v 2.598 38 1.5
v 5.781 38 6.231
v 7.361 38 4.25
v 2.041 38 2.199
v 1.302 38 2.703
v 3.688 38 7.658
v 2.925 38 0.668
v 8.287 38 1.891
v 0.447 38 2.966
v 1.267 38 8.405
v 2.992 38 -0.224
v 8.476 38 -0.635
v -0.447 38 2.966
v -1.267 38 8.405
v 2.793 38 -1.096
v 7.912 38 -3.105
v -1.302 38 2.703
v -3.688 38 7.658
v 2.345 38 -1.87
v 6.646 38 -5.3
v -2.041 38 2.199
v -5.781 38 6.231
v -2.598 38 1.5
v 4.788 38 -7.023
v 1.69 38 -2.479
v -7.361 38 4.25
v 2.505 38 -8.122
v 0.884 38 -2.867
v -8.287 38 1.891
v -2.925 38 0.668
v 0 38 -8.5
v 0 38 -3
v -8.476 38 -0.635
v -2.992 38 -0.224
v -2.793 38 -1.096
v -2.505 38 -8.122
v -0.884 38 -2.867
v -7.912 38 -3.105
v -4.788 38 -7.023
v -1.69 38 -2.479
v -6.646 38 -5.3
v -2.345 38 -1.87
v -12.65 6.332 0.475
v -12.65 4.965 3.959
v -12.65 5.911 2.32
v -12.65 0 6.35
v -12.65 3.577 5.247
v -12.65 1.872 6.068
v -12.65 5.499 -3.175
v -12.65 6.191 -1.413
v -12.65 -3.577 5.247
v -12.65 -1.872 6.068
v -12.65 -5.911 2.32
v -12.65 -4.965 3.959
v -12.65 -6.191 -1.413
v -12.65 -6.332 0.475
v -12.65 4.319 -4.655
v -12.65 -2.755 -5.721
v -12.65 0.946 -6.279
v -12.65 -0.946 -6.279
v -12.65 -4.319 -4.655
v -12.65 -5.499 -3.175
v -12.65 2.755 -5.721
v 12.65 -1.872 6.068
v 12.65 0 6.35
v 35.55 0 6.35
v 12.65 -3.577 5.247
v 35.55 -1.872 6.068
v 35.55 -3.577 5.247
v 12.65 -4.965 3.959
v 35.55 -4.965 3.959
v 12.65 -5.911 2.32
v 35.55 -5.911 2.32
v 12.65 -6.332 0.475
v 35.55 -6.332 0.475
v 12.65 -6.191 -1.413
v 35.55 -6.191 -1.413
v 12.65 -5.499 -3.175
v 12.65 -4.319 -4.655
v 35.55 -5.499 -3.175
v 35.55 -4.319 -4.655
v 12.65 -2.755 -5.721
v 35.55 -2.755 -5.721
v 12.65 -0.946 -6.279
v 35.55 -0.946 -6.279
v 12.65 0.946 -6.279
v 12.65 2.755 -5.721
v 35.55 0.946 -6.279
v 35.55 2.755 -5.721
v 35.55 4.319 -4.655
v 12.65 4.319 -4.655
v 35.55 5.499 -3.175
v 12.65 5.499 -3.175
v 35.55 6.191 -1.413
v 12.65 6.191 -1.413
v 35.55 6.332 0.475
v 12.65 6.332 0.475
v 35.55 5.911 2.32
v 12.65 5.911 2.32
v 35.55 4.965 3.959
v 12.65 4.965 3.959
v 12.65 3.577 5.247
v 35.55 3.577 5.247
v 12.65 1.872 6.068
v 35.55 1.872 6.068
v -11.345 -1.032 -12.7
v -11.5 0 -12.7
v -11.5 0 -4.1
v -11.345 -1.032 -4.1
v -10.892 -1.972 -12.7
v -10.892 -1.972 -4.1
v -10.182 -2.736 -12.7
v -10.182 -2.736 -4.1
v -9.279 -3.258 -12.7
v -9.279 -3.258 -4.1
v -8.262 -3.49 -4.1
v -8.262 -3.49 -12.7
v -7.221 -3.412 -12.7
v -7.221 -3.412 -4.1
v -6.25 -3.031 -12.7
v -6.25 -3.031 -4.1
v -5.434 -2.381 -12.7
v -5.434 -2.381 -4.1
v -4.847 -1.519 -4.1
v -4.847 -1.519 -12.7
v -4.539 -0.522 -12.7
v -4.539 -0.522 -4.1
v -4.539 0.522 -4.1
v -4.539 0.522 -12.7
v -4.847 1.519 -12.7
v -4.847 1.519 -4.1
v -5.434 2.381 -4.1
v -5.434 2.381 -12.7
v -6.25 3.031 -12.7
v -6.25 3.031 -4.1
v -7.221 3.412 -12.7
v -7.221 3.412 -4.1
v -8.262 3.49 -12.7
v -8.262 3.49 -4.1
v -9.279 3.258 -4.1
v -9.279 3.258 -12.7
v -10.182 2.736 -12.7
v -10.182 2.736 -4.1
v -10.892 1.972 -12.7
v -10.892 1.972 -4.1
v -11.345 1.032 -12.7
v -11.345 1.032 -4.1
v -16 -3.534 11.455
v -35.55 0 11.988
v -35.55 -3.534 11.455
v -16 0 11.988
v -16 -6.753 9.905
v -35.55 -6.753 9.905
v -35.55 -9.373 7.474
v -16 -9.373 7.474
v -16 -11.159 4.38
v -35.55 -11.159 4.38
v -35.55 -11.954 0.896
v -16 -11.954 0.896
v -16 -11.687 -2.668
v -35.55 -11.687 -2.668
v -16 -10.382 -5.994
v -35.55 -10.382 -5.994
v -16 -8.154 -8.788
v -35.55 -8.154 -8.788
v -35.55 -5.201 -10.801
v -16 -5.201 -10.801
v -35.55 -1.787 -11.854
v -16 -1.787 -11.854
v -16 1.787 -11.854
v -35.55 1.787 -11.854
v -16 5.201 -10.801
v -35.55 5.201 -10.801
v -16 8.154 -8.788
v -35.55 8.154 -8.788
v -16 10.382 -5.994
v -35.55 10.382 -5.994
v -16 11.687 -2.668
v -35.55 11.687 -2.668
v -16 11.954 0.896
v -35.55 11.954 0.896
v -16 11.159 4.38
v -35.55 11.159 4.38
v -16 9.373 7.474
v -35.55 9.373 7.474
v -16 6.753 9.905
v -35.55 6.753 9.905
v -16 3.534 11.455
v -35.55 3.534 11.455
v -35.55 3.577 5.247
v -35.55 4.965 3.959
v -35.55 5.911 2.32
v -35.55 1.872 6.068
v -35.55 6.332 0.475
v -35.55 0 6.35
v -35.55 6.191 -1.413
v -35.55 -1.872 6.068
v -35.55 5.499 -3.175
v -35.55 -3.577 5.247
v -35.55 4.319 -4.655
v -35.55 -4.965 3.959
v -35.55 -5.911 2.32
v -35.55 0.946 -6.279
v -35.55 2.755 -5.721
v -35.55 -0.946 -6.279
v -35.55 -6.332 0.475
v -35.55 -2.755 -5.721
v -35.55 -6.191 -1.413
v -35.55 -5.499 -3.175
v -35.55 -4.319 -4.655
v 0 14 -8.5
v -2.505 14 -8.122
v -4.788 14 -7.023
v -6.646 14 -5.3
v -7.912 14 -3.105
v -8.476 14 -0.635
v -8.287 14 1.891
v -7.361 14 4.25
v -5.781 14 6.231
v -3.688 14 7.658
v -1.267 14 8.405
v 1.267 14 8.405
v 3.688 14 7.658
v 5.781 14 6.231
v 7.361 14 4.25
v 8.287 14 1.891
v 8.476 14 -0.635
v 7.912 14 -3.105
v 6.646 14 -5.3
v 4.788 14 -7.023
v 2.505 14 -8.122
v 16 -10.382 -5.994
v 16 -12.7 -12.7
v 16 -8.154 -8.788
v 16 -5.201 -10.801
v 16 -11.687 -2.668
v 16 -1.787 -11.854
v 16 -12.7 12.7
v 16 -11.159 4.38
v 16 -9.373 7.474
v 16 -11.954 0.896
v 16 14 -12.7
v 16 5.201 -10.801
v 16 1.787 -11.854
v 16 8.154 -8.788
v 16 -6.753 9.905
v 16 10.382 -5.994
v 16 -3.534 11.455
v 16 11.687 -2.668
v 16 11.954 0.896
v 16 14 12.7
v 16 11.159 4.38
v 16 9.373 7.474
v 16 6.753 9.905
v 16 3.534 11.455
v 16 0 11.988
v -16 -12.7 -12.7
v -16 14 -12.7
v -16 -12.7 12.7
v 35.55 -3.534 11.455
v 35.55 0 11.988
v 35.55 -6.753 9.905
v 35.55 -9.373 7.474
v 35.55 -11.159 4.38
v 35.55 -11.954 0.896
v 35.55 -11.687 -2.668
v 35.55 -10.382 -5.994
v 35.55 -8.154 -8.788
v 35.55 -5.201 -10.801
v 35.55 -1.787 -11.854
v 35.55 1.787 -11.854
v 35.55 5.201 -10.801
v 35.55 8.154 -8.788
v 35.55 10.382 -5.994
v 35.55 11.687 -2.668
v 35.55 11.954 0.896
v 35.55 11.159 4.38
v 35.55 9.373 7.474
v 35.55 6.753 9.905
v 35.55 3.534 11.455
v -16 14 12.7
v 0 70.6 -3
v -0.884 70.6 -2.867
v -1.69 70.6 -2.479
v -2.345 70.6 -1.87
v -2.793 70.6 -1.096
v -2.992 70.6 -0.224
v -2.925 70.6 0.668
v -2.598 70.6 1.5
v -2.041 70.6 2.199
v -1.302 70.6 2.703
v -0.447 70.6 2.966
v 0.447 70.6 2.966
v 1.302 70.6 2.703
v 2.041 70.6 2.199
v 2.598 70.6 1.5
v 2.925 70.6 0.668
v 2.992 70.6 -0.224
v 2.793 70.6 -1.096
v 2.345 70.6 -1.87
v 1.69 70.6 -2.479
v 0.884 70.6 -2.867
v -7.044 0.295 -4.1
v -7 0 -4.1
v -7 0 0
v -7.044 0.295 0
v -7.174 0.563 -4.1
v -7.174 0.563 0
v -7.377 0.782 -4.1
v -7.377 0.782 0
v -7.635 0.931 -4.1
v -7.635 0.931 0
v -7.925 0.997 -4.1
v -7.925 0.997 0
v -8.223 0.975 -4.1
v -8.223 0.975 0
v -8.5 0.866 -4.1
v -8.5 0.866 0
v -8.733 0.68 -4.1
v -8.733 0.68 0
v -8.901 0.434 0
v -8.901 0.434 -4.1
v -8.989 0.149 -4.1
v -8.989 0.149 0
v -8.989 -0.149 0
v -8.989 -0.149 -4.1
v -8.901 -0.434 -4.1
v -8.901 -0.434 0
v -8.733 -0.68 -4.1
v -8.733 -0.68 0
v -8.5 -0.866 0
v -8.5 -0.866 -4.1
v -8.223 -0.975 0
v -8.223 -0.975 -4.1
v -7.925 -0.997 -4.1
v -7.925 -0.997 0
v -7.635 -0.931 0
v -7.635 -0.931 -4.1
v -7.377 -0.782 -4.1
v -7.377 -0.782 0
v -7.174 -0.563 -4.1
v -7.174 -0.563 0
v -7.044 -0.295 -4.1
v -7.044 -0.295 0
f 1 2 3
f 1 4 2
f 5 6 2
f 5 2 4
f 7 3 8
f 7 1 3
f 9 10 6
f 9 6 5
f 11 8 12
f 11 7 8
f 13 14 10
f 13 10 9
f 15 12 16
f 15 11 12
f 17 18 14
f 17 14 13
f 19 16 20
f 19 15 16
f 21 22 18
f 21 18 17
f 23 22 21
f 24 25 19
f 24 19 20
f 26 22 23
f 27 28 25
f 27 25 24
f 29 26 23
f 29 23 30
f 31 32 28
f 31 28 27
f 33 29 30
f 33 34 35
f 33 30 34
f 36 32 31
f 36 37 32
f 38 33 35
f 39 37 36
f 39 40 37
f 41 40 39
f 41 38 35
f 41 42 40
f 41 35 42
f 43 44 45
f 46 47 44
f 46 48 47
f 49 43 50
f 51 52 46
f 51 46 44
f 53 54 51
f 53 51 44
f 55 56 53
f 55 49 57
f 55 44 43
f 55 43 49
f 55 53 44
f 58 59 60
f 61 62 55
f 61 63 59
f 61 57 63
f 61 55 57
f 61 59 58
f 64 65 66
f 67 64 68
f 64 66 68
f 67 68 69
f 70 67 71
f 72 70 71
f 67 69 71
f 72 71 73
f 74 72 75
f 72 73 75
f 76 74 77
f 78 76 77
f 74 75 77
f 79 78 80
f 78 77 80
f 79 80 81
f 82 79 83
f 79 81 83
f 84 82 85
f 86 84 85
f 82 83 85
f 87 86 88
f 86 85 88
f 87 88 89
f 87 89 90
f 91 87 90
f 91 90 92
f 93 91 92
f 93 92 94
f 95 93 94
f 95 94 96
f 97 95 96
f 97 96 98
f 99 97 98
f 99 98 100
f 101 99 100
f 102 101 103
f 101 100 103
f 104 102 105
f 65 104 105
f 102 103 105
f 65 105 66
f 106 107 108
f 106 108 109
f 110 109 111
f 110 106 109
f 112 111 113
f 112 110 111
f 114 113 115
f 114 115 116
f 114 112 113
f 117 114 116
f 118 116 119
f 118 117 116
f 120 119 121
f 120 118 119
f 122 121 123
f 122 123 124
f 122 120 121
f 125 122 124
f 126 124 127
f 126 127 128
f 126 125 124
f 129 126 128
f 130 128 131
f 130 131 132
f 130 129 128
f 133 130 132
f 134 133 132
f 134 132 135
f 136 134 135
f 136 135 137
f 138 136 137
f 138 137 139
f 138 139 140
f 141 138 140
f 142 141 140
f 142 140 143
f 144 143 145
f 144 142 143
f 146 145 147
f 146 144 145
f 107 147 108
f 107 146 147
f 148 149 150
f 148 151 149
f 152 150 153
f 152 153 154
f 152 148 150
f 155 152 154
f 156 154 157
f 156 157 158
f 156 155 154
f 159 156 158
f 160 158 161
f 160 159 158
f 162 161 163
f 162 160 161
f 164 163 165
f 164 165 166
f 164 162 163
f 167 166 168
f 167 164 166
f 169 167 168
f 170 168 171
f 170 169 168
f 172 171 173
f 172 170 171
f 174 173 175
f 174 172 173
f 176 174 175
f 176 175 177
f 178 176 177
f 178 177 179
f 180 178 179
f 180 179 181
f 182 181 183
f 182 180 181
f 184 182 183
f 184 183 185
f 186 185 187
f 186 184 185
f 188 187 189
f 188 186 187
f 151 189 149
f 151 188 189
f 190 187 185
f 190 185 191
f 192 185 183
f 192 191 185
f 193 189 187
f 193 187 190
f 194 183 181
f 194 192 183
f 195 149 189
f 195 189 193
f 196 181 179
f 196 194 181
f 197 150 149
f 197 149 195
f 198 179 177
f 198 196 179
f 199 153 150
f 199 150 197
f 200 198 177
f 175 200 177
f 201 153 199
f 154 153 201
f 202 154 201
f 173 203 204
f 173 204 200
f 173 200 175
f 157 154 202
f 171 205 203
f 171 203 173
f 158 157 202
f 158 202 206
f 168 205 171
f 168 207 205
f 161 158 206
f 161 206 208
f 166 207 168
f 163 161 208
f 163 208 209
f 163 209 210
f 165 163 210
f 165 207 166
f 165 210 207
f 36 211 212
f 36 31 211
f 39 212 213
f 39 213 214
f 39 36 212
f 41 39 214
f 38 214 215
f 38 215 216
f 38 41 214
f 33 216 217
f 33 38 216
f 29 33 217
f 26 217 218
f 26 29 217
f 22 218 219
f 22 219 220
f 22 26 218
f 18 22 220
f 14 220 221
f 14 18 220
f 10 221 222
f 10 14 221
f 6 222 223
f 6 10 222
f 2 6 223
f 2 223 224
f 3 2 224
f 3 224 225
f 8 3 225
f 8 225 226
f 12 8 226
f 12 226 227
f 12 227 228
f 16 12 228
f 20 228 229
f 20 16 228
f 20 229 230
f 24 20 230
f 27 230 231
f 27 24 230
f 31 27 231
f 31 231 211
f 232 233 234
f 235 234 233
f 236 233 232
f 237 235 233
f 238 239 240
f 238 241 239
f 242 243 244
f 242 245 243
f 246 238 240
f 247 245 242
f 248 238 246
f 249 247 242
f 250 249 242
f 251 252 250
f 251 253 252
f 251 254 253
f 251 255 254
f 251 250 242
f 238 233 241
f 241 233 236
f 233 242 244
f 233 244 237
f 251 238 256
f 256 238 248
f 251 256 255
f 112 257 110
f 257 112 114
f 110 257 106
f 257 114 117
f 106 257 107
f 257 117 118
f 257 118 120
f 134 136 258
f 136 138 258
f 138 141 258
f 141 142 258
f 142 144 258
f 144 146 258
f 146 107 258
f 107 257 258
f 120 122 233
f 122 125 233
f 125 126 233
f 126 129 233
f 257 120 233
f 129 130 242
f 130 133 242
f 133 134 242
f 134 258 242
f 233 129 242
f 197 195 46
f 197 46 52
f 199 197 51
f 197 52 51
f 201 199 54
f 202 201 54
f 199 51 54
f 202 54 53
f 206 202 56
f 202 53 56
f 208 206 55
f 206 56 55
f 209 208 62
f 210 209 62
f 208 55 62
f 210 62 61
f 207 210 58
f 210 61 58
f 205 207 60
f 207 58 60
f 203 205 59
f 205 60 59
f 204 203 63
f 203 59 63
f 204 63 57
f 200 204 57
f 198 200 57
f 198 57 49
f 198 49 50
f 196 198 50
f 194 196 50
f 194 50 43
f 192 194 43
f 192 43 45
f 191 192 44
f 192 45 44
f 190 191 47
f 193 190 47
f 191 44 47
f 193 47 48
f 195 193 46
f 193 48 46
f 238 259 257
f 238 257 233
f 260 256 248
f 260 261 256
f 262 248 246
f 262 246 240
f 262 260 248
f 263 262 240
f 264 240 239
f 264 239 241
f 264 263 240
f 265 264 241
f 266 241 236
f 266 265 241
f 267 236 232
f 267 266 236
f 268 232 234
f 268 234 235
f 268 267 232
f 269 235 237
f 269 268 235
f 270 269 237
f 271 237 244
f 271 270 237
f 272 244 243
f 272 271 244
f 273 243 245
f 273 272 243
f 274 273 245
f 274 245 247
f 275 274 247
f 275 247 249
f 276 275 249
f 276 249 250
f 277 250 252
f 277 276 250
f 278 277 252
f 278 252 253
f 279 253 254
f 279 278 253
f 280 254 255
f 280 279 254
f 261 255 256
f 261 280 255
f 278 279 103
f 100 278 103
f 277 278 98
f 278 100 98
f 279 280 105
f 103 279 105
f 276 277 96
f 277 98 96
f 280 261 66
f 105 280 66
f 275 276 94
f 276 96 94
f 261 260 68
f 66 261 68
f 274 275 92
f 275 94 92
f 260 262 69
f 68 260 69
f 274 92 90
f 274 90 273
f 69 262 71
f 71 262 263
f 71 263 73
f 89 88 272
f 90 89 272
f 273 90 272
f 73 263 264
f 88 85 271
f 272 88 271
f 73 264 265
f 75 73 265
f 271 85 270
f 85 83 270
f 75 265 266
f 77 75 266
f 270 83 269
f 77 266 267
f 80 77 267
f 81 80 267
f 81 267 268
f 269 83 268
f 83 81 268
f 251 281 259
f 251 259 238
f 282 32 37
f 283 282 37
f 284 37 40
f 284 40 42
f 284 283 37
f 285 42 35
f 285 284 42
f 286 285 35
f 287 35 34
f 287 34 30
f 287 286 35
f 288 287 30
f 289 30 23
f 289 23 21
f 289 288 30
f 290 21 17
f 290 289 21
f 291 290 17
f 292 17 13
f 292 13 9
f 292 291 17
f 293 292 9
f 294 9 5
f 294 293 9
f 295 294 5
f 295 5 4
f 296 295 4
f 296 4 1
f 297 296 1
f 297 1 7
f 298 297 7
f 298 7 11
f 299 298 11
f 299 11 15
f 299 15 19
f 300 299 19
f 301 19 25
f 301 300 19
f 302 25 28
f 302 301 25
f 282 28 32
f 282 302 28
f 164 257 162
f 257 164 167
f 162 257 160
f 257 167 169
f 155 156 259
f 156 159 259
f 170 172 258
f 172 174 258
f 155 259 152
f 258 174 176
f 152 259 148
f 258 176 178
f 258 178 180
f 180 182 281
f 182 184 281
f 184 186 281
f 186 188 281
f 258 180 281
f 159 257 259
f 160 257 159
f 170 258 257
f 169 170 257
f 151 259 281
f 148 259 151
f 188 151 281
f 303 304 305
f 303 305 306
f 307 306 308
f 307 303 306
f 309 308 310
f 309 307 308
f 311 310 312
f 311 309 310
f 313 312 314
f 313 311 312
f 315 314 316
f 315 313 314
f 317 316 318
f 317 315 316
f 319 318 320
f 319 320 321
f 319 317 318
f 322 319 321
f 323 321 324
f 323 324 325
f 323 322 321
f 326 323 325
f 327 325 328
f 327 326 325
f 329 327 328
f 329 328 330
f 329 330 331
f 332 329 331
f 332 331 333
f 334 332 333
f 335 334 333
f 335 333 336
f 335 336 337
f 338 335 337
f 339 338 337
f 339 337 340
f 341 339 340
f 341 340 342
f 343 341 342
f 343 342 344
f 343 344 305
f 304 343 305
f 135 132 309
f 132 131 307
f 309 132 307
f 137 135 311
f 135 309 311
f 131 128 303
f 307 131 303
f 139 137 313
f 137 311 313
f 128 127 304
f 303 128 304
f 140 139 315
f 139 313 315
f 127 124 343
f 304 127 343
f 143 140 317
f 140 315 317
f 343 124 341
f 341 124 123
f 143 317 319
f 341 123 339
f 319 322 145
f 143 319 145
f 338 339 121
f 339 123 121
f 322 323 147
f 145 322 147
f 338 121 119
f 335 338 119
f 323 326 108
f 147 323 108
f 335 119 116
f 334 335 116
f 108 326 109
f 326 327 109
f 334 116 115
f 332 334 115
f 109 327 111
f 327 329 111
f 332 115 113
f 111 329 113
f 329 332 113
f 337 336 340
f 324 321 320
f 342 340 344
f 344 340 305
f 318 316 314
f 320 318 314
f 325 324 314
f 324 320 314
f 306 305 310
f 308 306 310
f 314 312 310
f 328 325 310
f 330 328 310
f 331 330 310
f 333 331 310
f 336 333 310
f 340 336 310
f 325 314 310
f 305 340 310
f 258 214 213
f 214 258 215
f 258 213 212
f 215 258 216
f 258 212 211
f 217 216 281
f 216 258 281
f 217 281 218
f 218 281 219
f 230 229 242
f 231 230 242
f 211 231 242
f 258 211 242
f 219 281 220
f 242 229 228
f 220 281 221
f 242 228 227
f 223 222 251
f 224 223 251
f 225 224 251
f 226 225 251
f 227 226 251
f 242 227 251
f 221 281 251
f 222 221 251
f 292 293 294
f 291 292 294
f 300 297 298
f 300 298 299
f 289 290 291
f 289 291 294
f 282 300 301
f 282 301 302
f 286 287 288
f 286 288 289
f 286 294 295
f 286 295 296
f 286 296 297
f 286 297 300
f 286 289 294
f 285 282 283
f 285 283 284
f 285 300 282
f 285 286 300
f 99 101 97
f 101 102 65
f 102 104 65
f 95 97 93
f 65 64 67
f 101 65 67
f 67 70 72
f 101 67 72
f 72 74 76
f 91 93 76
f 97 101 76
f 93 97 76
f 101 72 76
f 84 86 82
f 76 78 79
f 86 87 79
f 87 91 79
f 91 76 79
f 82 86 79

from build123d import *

# Parameters (mm, degrees)
BODY_SKETCH_W                   = 32
BODY_SKETCH_H                   = 26.7
BODY_DEPTH                      = 12.7
NUT_X_SKETCH_W                  = 19.55
NUT_X_SKETCH_H                  = 11.988
NUT_X_SKETCH_2_W                = 19.55
NUT_X_SKETCH_2_H                = 11.988
SOCKET_X_SKETCH_W               = 23.9
SOCKET_X_SKETCH_H               = 6.35
SOCKET_X_SKETCH_2_W             = 23.9
SOCKET_X_SKETCH_2_H             = 6.35
TORCH_NITROUS_PORT_SKETCH_R     = 3.5
TORCH_NITROUS_PORT_DEPTH        = 8.6
TORCH_NITROUS_DRILLING_SKETCH_R = 1
TORCH_NITROUS_DRILLING_DEPTH    = 12.7


with BuildPart() as part:
    # Body Sketch → Body (new, symmetric)
    with BuildSketch(Plane.XY):
        with Locations((0, 0.65)):
            Rectangle(BODY_SKETCH_W, BODY_SKETCH_H)
    extrude(amount=BODY_DEPTH, both=True)

    # Nut _X Sketch → Nut _X (revolve)
    with BuildSketch(Plane.XY):
        with Locations((25.775, 5.994)):
            Rectangle(NUT_X_SKETCH_W, NUT_X_SKETCH_H)
    revolve(axis=Axis((-1000, 0, 0), (1, 0, 0)))

    # Nut -X Sketch 2 → Nut -X 2 (revolve)
    with BuildSketch(Plane.XY):
        with Locations((-25.775, 5.994)):
            Rectangle(NUT_X_SKETCH_2_W, NUT_X_SKETCH_2_H)
    revolve(axis=Axis((-1000, 0, 0), (1, 0, 0)))

    # Socket _X Sketch → Socket _X (revolve, cut)
    with BuildSketch(Plane.XY):
        with Locations((24.6, 3.175)):
            Rectangle(SOCKET_X_SKETCH_W, SOCKET_X_SKETCH_H)
    revolve(axis=Axis((-1000, 0, 0), (1, 0, 0)), mode=Mode.SUBTRACT)

    # Socket -X Sketch 2 → Socket -X 2 (revolve, cut)
    with BuildSketch(Plane.XY):
        with Locations((-24.6, 3.175)):
            Rectangle(SOCKET_X_SKETCH_2_W, SOCKET_X_SKETCH_2_H)
    revolve(axis=Axis((-1000, 0, 0), (1, 0, 0)), mode=Mode.SUBTRACT)

    # Stem Sketch → Stem (revolve)
    with BuildSketch(Plane.XY):
        Polygon((0, 14), (8.5, 14), (8.5, 38), (3, 38), (3, 70.6), (0, 70.6), align=None)
    revolve(axis=Axis((0, -500, 0), (0, 1, 0)))

    # Torch Nitrous Port Sketch → Torch Nitrous Port (cut)
    with BuildSketch(Plane.XY.offset(-12.7)):
        with Locations((-8, 0)):
            Circle(TORCH_NITROUS_PORT_SKETCH_R)
    extrude(amount=TORCH_NITROUS_PORT_DEPTH, mode=Mode.SUBTRACT)

    # Torch Nitrous Drilling Sketch → Torch Nitrous Drilling (cut)
    with BuildSketch(Plane.XY.offset(-12.7)):
        with Locations((-8, 0)):
            Circle(TORCH_NITROUS_DRILLING_SKETCH_R)
    extrude(amount=TORCH_NITROUS_DRILLING_DEPTH, mode=Mode.SUBTRACT)


solid = part.part
